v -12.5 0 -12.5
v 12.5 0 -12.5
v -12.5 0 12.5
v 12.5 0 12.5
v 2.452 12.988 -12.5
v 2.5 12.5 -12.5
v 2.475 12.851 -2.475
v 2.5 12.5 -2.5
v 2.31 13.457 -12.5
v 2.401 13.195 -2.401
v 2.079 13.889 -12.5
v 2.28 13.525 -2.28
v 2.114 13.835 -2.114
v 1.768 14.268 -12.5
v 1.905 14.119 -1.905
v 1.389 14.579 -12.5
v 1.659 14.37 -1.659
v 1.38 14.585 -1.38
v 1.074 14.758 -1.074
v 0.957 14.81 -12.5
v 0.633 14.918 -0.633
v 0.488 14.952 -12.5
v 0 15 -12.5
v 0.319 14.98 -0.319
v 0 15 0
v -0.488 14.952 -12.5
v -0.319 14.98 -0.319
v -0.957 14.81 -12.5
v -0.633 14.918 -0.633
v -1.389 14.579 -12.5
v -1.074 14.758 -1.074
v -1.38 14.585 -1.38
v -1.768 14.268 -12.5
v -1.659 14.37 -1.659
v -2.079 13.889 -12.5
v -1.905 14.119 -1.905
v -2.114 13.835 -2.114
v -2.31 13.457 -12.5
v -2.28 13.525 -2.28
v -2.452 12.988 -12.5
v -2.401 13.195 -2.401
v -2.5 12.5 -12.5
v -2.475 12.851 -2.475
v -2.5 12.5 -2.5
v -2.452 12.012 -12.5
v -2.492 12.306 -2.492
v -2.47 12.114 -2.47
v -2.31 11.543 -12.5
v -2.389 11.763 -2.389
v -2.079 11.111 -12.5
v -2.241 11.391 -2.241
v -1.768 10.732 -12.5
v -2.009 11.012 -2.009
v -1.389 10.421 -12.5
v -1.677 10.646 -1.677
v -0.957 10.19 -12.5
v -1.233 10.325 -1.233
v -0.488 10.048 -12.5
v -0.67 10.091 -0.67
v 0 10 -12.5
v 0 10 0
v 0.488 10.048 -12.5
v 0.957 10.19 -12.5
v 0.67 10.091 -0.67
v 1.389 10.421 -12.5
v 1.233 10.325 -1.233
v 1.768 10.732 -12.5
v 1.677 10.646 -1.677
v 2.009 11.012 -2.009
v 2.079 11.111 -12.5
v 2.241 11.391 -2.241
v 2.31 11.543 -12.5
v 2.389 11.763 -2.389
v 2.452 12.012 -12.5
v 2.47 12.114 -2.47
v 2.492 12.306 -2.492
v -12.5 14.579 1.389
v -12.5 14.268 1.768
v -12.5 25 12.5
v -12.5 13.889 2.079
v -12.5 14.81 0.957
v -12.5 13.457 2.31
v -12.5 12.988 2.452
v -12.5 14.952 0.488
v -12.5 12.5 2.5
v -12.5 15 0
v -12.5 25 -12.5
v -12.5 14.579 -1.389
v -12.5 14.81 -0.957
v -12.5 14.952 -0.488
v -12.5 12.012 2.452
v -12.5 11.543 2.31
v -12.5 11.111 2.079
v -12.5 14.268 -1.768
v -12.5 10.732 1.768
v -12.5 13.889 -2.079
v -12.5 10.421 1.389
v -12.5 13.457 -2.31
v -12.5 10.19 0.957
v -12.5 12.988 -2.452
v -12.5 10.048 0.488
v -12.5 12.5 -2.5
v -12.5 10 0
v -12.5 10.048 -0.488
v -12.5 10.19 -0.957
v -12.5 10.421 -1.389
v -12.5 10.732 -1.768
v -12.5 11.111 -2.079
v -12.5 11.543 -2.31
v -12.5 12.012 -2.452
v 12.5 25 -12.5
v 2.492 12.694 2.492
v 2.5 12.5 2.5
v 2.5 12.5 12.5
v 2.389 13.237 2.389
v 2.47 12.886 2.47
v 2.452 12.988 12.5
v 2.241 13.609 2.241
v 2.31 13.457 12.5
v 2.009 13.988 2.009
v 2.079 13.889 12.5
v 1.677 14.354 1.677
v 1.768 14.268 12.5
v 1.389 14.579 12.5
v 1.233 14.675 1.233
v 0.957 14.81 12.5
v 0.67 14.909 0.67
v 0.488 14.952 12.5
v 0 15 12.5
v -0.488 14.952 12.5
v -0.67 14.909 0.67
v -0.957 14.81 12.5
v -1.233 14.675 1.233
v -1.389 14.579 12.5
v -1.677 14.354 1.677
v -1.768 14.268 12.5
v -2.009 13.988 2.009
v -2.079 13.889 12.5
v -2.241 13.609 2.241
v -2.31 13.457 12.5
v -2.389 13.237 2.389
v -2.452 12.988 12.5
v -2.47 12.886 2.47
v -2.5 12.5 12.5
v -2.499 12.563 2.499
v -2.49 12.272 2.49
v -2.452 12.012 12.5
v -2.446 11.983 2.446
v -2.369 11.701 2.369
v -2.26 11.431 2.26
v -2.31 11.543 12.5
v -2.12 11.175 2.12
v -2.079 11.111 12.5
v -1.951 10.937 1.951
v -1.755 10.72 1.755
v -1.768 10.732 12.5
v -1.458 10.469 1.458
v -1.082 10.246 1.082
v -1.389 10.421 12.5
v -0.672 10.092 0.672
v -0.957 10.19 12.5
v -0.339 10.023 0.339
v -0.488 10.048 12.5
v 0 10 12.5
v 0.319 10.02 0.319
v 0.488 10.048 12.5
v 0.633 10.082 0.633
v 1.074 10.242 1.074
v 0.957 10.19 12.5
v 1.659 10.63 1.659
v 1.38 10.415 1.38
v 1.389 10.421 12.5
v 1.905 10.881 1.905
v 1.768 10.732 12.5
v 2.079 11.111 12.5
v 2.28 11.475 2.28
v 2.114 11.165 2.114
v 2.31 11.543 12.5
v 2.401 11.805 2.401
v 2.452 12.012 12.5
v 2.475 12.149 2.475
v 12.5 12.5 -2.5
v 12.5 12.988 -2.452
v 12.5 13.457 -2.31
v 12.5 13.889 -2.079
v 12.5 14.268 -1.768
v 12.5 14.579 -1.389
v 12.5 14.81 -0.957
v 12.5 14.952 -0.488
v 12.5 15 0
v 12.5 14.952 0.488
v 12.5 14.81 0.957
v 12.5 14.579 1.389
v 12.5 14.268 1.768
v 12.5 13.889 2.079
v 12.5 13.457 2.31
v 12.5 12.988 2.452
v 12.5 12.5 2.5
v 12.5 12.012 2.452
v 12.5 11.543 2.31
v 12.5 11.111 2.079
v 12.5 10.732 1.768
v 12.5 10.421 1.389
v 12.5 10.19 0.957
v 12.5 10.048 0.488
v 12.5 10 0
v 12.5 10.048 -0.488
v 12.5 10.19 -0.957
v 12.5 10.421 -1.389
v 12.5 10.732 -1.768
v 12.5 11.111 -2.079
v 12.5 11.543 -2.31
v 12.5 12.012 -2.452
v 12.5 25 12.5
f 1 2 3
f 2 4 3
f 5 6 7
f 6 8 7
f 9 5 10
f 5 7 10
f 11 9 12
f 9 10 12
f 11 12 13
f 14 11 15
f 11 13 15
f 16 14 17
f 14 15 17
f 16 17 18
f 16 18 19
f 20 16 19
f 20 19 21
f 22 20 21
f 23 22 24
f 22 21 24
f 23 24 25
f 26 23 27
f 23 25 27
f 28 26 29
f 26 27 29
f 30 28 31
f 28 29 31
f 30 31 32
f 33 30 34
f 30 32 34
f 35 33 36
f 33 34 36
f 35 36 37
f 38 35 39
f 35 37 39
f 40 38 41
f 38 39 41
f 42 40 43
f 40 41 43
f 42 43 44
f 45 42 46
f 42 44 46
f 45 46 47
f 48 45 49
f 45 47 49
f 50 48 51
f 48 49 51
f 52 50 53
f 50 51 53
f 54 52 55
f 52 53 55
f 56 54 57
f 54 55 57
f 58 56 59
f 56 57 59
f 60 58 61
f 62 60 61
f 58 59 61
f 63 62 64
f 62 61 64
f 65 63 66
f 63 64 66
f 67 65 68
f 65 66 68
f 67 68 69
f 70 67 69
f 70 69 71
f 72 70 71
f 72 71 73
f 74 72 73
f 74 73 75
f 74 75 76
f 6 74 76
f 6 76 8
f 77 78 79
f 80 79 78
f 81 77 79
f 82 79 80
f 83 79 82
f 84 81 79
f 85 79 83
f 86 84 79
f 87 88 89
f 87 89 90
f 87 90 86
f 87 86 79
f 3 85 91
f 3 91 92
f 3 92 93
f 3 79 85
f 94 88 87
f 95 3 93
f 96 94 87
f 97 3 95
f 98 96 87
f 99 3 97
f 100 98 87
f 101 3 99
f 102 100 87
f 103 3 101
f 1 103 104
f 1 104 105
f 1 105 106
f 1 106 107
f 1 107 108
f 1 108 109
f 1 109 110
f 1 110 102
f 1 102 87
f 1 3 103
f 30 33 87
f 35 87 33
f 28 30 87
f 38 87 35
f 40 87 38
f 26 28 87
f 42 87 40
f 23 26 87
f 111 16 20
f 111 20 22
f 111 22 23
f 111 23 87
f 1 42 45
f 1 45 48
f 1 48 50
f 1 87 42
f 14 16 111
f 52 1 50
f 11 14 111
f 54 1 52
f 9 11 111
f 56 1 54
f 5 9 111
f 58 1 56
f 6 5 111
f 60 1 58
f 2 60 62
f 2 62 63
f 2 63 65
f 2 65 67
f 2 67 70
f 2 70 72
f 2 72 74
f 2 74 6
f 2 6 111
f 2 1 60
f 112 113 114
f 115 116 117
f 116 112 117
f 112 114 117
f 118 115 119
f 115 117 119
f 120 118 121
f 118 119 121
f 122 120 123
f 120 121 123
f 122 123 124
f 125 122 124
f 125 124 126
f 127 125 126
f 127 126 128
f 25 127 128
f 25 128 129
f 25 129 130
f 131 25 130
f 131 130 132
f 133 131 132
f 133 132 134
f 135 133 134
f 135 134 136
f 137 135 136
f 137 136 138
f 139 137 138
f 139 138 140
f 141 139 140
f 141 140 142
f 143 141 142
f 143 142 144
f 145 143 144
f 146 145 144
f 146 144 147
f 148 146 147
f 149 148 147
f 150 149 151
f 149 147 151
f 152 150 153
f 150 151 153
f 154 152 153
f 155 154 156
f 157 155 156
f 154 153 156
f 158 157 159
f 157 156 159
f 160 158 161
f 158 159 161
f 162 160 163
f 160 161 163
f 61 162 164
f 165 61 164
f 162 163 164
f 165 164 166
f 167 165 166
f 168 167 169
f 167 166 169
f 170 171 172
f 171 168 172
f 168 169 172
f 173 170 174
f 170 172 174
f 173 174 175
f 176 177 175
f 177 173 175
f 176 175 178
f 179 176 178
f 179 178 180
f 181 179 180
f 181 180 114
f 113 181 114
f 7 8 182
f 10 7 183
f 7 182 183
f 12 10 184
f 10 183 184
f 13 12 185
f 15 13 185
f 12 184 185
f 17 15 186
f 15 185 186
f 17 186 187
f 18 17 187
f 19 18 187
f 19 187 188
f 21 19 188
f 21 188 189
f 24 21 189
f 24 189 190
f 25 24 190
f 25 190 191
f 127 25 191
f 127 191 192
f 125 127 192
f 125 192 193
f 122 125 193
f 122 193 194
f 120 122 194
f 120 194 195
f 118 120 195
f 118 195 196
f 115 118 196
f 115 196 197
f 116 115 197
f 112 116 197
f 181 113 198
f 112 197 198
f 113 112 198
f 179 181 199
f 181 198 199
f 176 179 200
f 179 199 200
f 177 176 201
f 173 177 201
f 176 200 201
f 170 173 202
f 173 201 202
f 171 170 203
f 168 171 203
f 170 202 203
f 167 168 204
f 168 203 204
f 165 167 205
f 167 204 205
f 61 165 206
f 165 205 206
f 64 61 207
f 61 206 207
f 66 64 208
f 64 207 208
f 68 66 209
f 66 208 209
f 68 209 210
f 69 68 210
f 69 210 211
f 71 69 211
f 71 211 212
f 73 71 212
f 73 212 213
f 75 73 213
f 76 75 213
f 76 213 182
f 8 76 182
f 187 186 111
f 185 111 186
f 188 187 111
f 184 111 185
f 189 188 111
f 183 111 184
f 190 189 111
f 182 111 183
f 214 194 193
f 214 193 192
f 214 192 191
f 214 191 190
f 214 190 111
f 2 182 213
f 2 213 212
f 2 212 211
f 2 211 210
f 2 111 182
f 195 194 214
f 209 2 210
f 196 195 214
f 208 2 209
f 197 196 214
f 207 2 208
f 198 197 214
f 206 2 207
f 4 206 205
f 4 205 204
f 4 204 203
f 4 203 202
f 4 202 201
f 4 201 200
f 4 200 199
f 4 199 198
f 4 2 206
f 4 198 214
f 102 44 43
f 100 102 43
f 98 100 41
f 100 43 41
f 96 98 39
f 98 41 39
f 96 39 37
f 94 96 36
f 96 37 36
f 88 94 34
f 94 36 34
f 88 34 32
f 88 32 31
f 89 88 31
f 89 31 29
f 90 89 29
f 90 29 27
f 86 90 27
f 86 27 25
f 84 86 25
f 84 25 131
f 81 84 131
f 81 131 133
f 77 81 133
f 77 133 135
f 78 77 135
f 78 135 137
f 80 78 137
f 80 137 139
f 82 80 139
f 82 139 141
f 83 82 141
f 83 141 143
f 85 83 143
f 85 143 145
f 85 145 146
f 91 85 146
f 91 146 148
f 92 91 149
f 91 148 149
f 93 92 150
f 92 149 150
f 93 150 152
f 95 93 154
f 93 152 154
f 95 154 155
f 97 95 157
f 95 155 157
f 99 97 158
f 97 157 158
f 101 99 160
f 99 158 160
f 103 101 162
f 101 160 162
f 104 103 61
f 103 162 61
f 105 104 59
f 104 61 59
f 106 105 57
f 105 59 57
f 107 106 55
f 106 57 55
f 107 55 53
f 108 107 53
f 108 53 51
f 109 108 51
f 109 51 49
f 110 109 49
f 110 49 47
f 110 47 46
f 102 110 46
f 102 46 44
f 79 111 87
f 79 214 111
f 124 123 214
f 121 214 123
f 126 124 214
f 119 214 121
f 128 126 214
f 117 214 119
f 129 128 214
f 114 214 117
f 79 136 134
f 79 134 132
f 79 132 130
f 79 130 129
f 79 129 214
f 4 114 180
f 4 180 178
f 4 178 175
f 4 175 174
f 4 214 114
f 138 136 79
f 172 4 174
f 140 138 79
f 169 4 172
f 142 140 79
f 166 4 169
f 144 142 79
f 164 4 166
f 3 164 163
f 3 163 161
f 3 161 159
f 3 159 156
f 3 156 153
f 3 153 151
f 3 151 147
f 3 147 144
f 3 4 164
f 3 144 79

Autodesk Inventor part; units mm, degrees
ref_plane "YZ Plane" through (0, 0, 0) normal (1, 0, 0) x (0, 1, 0)
ref_plane "XZ Plane" through (0, 0, 0) normal (0, 1, 0) x (-1, 0, 0)
ref_plane "XY Plane" through (0, 0, 0) normal (0, 0, 1) x (1, 0, 0)
sketch "Sketch1" plane through (0, 0, 0) normal (0, 1, 0) x (-1, 0, 0)
  line L0 (12.5, -12.5) -> (-12.5, -12.5)
  line L1 (-12.5, -12.5) -> (-12.5, 12.5)
  line L2 (-12.5, 12.5) -> (12.5, 12.5)
  line L3 (12.5, 12.5) -> (12.5, -12.5)
  line L4 (12.5, -12.5) -> (-12.5, 12.5) construction
  line L5 (-12.5, -12.5) -> (12.5, 12.5) construction
  point P0 (0, 0)
  dimension "d0" = 25
  dimension "d1" = 25
extrude "Extrusion1" add sketch "Sketch1" along normal blind 25
sketch "Sketch2" plane through (12.5, 0, 12.5) normal (1, 0, 0) x (0, 0, -1)
  line L0 (0, 0) -> (25, 0) projected
  line L1 (0, 0) -> (25, 25)
  circle A0 centre (12.5, 12.5) radius 2.5
  point P0 (12.5, 0)
  dimension "d4" = 5
extrude "Extrusion2" cut sketch "Sketch2" against normal blind 25
sketch "Sketch3" plane through (-12.5, 0, 12.5) normal (0, 0, 1) x (1, 0, 0)
  line L0 (25, 25) -> (0, 25) projected
  line L1 (25, 0) -> (25, 25) projected
  line L2 (0, 25) -> (25, 0)
  circle A0 centre (12.5, 12.5) radius 2.5
  point P0 (12.5, 0)
  dimension "d7" = 5
extrude "Extrusion3" cut sketch "Sketch3" against normal blind 25 contours A0 L2 | L2 A0
properties part number "coupling"
